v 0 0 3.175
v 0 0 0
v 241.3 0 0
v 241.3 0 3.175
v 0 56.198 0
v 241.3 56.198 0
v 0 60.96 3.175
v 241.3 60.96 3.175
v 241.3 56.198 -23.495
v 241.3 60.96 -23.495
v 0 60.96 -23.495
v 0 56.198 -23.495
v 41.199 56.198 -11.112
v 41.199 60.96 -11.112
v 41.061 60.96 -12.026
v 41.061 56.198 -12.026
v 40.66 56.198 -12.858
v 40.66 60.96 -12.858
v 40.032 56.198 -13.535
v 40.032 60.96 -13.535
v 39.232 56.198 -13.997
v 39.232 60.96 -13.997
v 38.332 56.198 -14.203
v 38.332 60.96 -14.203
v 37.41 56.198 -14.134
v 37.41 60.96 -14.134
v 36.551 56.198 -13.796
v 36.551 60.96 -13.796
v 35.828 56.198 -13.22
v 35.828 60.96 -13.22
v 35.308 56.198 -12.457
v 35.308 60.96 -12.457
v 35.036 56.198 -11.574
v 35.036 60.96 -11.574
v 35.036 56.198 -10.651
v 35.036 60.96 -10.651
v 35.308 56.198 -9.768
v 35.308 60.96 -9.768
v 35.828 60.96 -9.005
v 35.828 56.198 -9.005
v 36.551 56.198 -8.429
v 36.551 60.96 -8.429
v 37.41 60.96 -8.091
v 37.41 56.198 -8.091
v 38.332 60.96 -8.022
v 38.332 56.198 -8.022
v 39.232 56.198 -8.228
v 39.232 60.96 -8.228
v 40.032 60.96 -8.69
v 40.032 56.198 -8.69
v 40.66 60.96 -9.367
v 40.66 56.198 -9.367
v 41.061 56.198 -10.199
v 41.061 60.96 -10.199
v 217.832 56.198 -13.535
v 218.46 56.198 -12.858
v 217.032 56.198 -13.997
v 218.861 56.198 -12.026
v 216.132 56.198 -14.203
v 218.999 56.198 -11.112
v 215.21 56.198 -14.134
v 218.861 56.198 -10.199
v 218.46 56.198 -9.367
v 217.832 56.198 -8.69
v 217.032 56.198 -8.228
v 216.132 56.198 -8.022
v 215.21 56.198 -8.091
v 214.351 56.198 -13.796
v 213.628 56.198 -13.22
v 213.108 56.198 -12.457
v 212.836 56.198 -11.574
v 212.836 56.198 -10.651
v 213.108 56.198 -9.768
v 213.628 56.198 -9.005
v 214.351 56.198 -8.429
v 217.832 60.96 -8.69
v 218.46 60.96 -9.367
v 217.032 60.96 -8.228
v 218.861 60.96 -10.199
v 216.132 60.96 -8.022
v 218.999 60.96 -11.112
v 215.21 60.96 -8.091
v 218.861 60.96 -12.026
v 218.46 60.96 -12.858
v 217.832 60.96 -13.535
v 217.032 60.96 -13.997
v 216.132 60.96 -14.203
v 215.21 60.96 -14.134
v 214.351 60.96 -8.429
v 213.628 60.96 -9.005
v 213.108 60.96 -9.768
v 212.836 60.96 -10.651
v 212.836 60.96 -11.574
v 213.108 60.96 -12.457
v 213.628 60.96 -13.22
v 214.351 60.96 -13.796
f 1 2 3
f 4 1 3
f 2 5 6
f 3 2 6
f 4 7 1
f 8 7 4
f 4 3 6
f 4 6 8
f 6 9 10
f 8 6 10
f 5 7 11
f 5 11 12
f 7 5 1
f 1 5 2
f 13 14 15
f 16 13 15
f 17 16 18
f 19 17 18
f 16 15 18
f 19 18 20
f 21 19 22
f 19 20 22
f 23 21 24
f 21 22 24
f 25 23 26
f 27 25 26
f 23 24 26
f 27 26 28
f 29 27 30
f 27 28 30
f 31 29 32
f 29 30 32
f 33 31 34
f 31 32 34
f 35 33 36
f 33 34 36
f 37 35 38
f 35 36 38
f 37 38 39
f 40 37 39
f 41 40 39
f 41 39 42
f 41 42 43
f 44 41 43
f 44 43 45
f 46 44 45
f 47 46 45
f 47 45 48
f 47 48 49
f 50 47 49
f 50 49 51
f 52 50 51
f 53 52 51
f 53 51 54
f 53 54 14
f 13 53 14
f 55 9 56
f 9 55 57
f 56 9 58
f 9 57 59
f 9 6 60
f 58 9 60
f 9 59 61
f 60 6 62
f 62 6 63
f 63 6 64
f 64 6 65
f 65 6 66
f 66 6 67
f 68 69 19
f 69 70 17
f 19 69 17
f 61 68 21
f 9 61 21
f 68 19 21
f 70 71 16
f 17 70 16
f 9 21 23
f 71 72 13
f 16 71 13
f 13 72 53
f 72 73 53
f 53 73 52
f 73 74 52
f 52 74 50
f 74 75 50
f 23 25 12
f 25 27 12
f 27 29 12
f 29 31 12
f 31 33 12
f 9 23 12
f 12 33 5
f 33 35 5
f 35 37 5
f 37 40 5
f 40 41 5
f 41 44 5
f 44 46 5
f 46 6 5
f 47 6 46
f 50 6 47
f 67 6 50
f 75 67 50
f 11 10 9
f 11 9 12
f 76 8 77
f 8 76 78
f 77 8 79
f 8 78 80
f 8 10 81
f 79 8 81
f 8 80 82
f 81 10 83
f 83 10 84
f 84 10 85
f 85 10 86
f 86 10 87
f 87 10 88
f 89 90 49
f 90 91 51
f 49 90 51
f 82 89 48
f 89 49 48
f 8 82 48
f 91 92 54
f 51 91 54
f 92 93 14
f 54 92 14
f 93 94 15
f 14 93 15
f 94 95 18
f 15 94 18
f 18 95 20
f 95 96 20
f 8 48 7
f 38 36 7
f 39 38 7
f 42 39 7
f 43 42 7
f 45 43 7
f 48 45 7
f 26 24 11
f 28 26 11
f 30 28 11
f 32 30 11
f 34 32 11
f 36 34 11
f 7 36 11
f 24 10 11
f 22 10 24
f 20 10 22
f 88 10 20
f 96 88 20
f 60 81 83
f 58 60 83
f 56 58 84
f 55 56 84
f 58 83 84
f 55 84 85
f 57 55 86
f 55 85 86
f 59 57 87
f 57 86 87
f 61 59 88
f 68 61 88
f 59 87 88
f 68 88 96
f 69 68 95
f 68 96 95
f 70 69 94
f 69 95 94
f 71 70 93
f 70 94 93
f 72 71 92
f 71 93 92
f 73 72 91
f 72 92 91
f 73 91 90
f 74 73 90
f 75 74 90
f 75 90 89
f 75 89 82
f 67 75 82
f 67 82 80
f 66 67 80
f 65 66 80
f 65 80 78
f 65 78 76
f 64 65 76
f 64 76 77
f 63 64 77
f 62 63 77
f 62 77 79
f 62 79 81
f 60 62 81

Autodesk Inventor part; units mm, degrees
ref_plane "YZ Plane" through (0, 0, 0) normal (1, 0, 0) x (0, 1, 0)
ref_plane "XZ Plane" through (0, 0, 0) normal (0, 1, 0) x (-1, 0, 0)
ref_plane "XY Plane" through (0, 0, 0) normal (0, 0, 1) x (1, 0, 0)
sketch "Sketch1" plane through (0, 0, 0) normal (0, 0, 1) x (1, 0, 0)
  line L0 (0, 0) -> (241.3, 0)
  line L1 (241.3, 0) -> (241.3, 60.96)
  line L2 (241.3, 60.96) -> (0, 60.96)
  line L3 (0, 60.96) -> (0, 0)
  dimension "d0" = 241.3
  dimension "d1" = 60.96
extrude "Extrusion1" add sketch "Sketch1" along normal blind 3.175
sketch "Sketch2" plane through (0, 0, 0) normal (0, 0, -1) x (-1, 0, 0)
  line L0 (-241.3, 60.96) -> (0, 60.96) projected
  line L1 (-241.3, 0) -> (-241.3, 60.96) projected
  line L2 (0, 60.96) -> (-241.3, 60.96)
  line L3 (-241.3, 60.96) -> (-241.3, 56.1975)
  line L4 (-241.3, 56.1975) -> (0, 56.1975)
  line L5 (0, 56.1975) -> (0, 60.96)
  point P0 (0, 0)
  dimension "d4" = 4.7625
extrude "Extrusion2" add sketch "Sketch2" along normal blind 23.495
sketch "Sketch3" plane through (0, 60.96, 3.175) normal (0, 1, 0) x (1, 0, 0)
  circle A0 centre (38.1, 14.2875) radius 3.0988
  circle A1 centre (215.9, 14.2875) radius 3.0988
  line L0 (241.3, 26.67) -> (241.3, 0) projected
  line L1 (0, 26.67) -> (241.3, 26.67) projected
  point P0 (0, 3.175)
  dimension "d7" = 6.1976
  dimension "d8" = 6.1976
  dimension "d9" = 177.8
  dimension "d10" = 25.4
  dimension "d11" = 12.3825
  dimension "d12" = 12.3825
extrude "Extrusion3" cut sketch "Sketch3" against normal blind 6.1976
equation "\"d12\" = d11"
equation "\"d13\" = d8"
properties part number "Camera Mount"
